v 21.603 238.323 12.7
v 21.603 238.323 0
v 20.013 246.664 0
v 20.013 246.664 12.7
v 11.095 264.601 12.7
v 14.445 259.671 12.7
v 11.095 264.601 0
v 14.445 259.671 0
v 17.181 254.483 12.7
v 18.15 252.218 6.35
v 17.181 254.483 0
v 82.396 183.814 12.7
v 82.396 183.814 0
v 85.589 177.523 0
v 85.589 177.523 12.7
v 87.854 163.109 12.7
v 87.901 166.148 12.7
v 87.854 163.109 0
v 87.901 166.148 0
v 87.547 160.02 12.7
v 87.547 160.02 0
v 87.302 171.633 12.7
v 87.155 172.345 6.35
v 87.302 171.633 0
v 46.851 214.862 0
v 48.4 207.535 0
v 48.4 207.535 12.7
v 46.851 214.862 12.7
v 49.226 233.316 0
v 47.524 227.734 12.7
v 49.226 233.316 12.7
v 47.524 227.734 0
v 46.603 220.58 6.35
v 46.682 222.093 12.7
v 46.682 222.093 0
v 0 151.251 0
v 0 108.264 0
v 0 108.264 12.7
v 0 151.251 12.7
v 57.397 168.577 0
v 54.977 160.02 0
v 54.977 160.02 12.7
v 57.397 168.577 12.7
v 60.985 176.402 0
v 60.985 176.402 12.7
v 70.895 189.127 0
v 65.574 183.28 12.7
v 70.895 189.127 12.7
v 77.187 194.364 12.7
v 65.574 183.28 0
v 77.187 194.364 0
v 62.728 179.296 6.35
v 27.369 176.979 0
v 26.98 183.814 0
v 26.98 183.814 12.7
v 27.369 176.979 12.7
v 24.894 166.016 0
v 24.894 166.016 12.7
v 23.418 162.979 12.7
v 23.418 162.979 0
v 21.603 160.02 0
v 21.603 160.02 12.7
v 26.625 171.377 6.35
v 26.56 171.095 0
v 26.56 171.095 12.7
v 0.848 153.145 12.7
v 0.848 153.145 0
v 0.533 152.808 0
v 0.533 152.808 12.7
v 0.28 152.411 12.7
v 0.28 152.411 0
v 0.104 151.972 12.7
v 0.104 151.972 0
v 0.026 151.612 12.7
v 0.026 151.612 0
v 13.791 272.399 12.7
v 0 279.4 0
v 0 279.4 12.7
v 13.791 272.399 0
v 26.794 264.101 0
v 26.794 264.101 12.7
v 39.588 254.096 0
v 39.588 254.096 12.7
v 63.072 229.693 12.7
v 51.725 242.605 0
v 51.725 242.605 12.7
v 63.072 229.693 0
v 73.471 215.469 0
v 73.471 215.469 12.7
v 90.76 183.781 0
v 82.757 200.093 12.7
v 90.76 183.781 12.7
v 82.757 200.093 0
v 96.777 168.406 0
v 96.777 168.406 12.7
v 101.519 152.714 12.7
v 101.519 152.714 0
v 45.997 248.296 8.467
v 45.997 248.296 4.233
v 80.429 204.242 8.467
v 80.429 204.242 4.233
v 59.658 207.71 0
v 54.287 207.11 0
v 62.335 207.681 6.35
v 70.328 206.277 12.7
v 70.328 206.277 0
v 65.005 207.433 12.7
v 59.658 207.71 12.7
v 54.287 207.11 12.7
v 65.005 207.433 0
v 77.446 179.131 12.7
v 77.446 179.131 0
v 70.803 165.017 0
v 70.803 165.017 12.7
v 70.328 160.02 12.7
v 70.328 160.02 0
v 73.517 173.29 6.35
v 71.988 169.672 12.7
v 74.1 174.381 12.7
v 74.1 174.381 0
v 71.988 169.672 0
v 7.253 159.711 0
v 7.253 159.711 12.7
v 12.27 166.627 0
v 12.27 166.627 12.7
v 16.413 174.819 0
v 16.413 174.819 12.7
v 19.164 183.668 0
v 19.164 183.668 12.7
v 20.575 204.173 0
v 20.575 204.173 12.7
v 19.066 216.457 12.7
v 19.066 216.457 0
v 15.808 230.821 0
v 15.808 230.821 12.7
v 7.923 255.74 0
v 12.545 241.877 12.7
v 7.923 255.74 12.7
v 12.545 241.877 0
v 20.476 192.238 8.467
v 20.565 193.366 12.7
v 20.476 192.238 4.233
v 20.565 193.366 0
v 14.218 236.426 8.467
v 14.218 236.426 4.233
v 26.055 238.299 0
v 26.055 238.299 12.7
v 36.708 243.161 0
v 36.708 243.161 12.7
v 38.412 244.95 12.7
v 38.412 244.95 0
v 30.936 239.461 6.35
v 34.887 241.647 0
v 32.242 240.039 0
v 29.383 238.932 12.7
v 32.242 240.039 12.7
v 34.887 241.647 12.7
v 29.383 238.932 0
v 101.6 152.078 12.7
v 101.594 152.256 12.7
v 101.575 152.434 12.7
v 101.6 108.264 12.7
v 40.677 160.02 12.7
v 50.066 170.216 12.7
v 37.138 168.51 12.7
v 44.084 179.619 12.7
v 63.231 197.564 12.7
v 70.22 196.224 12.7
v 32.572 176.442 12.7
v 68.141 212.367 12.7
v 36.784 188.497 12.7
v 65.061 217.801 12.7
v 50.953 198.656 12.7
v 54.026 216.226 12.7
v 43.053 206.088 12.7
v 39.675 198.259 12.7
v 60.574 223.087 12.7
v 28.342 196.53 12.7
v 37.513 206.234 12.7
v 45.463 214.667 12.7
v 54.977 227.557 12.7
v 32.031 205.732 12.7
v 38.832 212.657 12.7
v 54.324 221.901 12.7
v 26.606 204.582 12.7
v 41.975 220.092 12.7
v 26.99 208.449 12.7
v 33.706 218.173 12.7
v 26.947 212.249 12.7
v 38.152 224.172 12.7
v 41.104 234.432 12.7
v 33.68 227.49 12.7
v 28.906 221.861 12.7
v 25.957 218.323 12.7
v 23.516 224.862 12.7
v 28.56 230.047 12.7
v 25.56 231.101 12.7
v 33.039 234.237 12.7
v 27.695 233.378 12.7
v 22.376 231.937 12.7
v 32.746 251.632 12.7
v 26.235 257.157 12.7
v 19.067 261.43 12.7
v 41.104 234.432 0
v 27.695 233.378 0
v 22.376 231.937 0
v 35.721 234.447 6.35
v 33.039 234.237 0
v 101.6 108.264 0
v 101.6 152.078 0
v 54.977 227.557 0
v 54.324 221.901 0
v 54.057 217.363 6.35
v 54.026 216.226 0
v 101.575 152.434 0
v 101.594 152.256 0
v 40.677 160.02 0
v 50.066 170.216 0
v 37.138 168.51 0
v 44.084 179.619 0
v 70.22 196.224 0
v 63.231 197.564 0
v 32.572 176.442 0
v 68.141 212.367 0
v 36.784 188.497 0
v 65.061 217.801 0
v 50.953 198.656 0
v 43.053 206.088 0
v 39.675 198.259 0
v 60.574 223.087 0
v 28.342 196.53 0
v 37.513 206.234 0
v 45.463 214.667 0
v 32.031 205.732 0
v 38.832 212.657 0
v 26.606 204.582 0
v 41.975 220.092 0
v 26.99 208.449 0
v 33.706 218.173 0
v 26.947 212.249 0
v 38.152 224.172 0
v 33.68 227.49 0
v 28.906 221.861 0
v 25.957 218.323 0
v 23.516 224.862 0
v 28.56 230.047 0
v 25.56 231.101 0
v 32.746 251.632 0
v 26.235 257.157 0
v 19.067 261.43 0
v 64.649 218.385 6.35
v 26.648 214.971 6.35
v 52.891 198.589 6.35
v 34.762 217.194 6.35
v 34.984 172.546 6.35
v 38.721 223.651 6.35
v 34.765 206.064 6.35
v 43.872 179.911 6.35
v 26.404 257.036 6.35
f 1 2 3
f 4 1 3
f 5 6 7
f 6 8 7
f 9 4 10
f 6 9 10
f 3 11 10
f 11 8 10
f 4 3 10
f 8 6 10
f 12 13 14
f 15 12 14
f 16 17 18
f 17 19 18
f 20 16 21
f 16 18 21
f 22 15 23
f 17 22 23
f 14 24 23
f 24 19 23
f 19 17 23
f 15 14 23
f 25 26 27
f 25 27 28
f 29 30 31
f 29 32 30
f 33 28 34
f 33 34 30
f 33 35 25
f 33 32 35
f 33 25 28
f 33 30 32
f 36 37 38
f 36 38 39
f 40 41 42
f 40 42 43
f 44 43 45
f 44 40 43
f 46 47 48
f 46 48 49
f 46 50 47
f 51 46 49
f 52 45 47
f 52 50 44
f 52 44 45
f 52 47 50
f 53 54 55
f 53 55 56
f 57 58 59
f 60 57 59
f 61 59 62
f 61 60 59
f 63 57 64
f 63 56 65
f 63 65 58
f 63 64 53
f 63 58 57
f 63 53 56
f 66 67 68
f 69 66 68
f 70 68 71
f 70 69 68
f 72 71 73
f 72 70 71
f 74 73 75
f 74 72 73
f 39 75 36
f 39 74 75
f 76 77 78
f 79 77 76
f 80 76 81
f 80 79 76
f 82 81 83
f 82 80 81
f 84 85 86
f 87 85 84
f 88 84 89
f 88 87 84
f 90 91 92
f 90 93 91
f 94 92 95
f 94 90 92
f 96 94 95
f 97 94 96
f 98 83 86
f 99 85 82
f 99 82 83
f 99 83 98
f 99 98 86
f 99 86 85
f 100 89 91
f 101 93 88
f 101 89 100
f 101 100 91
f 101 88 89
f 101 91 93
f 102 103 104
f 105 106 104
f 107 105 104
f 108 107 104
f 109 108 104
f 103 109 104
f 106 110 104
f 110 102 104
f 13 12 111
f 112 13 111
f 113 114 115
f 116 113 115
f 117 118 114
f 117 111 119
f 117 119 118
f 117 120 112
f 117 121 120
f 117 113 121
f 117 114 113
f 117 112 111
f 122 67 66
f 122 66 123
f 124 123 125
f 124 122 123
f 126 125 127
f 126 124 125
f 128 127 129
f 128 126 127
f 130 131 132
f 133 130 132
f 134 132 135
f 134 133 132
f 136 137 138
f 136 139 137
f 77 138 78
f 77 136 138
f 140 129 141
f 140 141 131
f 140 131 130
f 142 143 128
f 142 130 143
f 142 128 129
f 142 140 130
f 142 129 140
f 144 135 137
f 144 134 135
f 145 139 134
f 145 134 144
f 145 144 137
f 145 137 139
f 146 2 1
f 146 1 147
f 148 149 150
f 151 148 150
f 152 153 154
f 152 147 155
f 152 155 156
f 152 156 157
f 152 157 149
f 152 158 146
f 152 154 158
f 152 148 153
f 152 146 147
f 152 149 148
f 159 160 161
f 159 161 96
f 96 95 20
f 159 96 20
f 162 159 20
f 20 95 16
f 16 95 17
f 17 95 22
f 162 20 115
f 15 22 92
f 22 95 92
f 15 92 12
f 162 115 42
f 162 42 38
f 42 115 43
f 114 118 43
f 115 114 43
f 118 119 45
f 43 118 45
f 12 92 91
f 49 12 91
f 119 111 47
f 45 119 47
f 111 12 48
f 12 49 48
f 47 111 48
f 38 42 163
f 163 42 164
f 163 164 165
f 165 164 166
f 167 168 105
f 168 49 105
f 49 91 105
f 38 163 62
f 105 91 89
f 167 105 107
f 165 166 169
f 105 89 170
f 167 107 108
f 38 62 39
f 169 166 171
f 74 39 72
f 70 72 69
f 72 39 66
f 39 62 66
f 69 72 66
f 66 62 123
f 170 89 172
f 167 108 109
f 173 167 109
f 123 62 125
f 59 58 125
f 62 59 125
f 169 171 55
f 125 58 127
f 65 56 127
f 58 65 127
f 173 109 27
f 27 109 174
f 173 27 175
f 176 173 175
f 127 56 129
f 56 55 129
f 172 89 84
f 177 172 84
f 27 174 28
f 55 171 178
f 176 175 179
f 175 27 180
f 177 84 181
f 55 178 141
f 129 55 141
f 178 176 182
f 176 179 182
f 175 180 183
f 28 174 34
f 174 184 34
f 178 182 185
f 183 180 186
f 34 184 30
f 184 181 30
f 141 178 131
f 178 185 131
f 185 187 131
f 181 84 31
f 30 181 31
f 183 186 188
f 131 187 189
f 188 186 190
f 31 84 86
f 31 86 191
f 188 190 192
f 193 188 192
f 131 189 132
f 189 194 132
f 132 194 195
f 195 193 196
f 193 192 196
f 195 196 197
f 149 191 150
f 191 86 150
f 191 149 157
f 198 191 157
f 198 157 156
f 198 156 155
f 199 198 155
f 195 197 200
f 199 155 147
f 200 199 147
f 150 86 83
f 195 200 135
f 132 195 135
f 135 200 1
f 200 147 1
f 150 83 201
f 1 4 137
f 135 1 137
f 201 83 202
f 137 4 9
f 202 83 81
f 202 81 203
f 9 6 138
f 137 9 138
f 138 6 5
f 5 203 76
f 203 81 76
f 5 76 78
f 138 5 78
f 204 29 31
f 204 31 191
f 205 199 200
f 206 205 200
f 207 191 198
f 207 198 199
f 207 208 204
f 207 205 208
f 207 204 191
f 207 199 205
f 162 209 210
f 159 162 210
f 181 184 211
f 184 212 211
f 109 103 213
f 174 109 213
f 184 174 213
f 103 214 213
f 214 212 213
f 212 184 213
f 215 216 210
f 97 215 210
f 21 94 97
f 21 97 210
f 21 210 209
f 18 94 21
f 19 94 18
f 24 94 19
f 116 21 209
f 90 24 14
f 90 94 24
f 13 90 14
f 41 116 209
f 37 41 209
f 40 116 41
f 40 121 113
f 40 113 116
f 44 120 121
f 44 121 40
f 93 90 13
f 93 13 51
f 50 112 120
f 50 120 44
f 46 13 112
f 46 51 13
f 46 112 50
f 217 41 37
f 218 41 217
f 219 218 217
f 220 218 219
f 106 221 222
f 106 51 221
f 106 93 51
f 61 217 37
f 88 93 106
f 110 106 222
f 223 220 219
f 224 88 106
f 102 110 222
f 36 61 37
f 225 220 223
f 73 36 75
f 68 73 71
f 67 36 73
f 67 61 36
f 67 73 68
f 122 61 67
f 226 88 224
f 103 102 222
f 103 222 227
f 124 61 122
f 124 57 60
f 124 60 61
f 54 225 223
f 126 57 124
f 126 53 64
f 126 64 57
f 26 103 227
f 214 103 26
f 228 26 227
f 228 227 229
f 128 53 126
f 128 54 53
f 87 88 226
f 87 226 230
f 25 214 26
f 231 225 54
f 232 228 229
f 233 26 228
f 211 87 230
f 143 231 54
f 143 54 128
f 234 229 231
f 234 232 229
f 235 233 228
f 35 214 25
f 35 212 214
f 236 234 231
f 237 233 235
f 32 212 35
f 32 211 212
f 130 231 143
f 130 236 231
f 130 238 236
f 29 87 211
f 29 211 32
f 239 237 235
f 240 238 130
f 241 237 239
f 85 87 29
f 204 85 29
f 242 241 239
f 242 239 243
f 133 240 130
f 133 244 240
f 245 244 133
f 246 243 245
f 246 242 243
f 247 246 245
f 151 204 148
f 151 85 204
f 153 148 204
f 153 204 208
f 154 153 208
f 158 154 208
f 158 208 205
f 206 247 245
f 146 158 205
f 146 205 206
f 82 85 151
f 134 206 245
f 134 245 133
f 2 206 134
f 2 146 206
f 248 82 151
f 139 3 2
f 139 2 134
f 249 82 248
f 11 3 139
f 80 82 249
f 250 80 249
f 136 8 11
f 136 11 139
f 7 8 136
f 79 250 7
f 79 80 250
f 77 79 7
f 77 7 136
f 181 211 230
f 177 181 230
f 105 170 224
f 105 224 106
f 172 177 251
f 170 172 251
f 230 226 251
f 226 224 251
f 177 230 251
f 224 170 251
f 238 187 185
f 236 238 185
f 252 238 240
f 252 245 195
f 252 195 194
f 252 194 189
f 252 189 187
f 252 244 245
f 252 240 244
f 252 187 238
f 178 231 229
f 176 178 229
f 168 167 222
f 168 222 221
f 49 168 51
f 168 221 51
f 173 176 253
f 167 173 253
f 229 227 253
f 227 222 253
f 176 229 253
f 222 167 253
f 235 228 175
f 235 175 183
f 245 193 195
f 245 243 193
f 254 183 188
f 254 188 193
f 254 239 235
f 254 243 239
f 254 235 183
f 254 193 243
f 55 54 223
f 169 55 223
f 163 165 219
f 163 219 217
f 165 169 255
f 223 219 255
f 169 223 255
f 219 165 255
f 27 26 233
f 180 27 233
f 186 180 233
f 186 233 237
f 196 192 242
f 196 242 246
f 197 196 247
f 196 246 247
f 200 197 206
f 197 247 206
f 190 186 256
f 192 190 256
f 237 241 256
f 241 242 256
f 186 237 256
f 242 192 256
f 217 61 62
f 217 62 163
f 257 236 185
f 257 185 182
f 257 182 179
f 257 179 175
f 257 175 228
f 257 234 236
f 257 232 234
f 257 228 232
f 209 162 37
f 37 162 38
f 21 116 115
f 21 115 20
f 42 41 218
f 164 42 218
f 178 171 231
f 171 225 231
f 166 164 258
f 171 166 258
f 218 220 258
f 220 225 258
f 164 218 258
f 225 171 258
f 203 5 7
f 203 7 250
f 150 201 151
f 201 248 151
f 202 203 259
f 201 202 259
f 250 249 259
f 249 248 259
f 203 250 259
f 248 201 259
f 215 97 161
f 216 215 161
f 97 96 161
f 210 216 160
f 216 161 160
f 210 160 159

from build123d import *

# Parameters (mm, degrees)
SKETCH1_W           = 101.6
SKETCH1_H           = 152.4
BOSS_EXTRUDE1_DEPTH = 12.7
BOSS_EXTRUDE3_DEPTH = 12.7
FILLET1_R           = 2.54
FILLET2_R           = 5.08
CUT_EXTRUDE1_DEPTH  = 298.570512784


with BuildPart() as part:
    # Sketch1 → Boss-Extrude1 (new body)
    with BuildSketch(Plane.XY):
        with Locations((50.8, 76.2)):
            Rectangle(SKETCH1_W, SKETCH1_H)
    extrude(amount=BOSS_EXTRUDE1_DEPTH)

    # Sketch2 → Boss-Extrude3 (add)
    with BuildSketch(Plane.XY):
        with BuildLine():
            add(Edge.make_bspline(
                [(0, 152.4), (39.790111277, 186.839065643), (12.30975625, 238.845497073), (0, 279.4)],
                knots=[0, 0, 0, 0, 1, 1, 1, 1], degree=3))
            add(Edge.make_bspline(
                [(0, 279.4), (51.286050257, 256.550041835), (87.836892382, 205.957944637), (101.6, 152.4)],
                knots=[0, 0, 0, 0, 1, 1, 1, 1], degree=3))
            Line((101.6, 152.4), (0, 152.4))
        make_face()
        with BuildLine():
            add(Edge.make_bspline(
                [(49.225838487, 233.315766274), (35.641228944, 236.267866949), (22.375615267, 231.937259722)],
                knots=[0, 0, 0, 1, 1, 1], degree=2))
            add(Edge.make_bspline(
                [(48.400350721, 207.535437601), (42.054170901, 227.566198031), (22.375615267, 231.937259722)],
                knots=[0, 0, 0, 1, 1, 1], degree=2))
            add(Edge.make_bspline(
                [(48.400350721, 207.535437601), (44.393568943, 220.734513873), (49.225838487, 233.315766274)],
                knots=[0, 0, 0, 1, 1, 1], degree=2))
        make_face(mode=Mode.SUBTRACT)
        with BuildLine():
            add(Edge.make_bspline(
                [(43.05348098, 206.08803494), (36.239789994, 218.91266054), (23.516066372, 224.861937296)],
                knots=[0, 0, 0, 1, 1, 1], degree=2))
            add(Edge.make_bspline(
                [(23.516066372, 224.861937296), (28.235295407, 215.21927262), (26.605728117, 204.582177714)],
                knots=[0, 0, 0, 1, 1, 1], degree=2))
            add(Edge.make_bspline(
                [(26.605728117, 204.582177714), (34.700432609, 206.792891754), (43.05348098, 206.08803494)],
                knots=[0, 0, 0, 1, 1, 1], degree=2))
        make_face(mode=Mode.SUBTRACT)
        with BuildLine():
            add(Edge.make_bspline(
                [(82.396089655, 183.81371778), (70.6713649, 174.663598784), (70.32777317, 160.02)],
                knots=[0, 0, 0, 1, 1, 1], degree=2))
            Line((70.32777317, 160.02), (87.546521436, 160.02))
            add(Edge.make_bspline(
                [(82.396089655, 183.81371778), (89.339550367, 172.773814043), (87.546521436, 160.02)],
                knots=[0, 0, 0, 1, 1, 1], degree=2))
        make_face(mode=Mode.SUBTRACT)
        with BuildLine():
            add(Edge.make_bspline(
                [(26.980466376, 183.81374211), (28.958775605, 170.837543608), (21.602944743, 160.02)],
                knots=[0, 0, 0, 1, 1, 1], degree=2))
            Line((21.602944743, 160.02), (40.676641776, 160.02))
            add(Edge.make_bspline(
                [(26.980466376, 183.81374211), (36.13847285, 173.175056715), (40.676641776, 160.02)],
                knots=[0, 0, 0, 1, 1, 1], degree=2))
        make_face(mode=Mode.SUBTRACT)
        with BuildLine():
            add(Edge.make_bspline(
                [(54.97708308, 160.02), (46.08347584, 181.54755316), (28.342136903, 196.529802482)],
                knots=[0, 0, 0, 1, 1, 1], degree=2))
            add(Edge.make_bspline(
                [(28.342136903, 196.529802482), (53.017815002, 201.732288521), (77.187204495, 194.363538628)],
                knots=[0, 0, 0, 1, 1, 1], degree=2))
            add(Edge.make_bspline(
                [(54.97708308, 160.02), (59.374728895, 181.400643158), (77.187204495, 194.363538628)],
                knots=[0, 0, 0, 1, 1, 1], degree=2))
        make_face(mode=Mode.SUBTRACT)
        with BuildLine():
            add(Edge.make_bspline(
                [(70.328259561, 206.277457578), (62.361576962, 208.669014941), (54.287141362, 207.109917469)],
                knots=[0, 0, 0, 1, 1, 1], degree=2))
            add(Edge.make_bspline(
                [(54.287141362, 207.109917469), (53.482096811, 217.391663167), (54.97708308, 227.557269012)],
                knots=[0, 0, 0, 1, 1, 1], degree=2))
            add(Edge.make_bspline(
                [(54.97708308, 227.557269012), (66.645859754, 219.852180834), (70.328259561, 206.277457578)],
                knots=[0, 0, 0, 1, 1, 1], degree=2))
        make_face(mode=Mode.SUBTRACT)
        with BuildLine():
            add(Edge.make_bspline(
                [(21.602944743, 238.323137826), (19.95197567, 252.974545225), (11.094737768, 264.601494061)],
                knots=[0, 0, 0, 1, 1, 1], degree=2))
            add(Edge.make_bspline(
                [(11.094737768, 264.601494061), (28.053835186, 259.295838115), (38.412267282, 244.949944056)],
                knots=[0, 0, 0, 1, 1, 1], degree=2))
            add(Edge.make_bspline(
                [(21.602944743, 238.323137826), (31.864782779, 237.284469605), (38.412267282, 244.949944056)],
                knots=[0, 0, 0, 1, 1, 1], degree=2))
        make_face(mode=Mode.SUBTRACT)
    extrude(amount=BOSS_EXTRUDE3_DEPTH)

    # Fillet1
    fillet1_edges = [part.edges().sort_by_distance(p)[0] for p in [
        (101.6, 152.4, 6.35),
        (0, 152.4, 6.35),
    ]]
    fillet(fillet1_edges, radius=FILLET1_R)

    # Fillet2
    fillet2_edges = [part.edges().sort_by_distance(p)[0] for p in [
        (0, 0, 6.35),
        (101.6, 0, 6.35),
    ]]
    fillet(fillet2_edges, radius=FILLET2_R)

    # Sketch4 → Cut-Extrude1 (cut, through all)
    with BuildSketch(Plane.XY.offset(12.7)):
        Polygon((101.519048921, 108.263964199), (0, 108.263964199), (0, 0), (101.6, 0), (101.6, 108.263964199), align=None)
    extrude(amount=-CUT_EXTRUDE1_DEPTH, mode=Mode.SUBTRACT)


solid = part.part
